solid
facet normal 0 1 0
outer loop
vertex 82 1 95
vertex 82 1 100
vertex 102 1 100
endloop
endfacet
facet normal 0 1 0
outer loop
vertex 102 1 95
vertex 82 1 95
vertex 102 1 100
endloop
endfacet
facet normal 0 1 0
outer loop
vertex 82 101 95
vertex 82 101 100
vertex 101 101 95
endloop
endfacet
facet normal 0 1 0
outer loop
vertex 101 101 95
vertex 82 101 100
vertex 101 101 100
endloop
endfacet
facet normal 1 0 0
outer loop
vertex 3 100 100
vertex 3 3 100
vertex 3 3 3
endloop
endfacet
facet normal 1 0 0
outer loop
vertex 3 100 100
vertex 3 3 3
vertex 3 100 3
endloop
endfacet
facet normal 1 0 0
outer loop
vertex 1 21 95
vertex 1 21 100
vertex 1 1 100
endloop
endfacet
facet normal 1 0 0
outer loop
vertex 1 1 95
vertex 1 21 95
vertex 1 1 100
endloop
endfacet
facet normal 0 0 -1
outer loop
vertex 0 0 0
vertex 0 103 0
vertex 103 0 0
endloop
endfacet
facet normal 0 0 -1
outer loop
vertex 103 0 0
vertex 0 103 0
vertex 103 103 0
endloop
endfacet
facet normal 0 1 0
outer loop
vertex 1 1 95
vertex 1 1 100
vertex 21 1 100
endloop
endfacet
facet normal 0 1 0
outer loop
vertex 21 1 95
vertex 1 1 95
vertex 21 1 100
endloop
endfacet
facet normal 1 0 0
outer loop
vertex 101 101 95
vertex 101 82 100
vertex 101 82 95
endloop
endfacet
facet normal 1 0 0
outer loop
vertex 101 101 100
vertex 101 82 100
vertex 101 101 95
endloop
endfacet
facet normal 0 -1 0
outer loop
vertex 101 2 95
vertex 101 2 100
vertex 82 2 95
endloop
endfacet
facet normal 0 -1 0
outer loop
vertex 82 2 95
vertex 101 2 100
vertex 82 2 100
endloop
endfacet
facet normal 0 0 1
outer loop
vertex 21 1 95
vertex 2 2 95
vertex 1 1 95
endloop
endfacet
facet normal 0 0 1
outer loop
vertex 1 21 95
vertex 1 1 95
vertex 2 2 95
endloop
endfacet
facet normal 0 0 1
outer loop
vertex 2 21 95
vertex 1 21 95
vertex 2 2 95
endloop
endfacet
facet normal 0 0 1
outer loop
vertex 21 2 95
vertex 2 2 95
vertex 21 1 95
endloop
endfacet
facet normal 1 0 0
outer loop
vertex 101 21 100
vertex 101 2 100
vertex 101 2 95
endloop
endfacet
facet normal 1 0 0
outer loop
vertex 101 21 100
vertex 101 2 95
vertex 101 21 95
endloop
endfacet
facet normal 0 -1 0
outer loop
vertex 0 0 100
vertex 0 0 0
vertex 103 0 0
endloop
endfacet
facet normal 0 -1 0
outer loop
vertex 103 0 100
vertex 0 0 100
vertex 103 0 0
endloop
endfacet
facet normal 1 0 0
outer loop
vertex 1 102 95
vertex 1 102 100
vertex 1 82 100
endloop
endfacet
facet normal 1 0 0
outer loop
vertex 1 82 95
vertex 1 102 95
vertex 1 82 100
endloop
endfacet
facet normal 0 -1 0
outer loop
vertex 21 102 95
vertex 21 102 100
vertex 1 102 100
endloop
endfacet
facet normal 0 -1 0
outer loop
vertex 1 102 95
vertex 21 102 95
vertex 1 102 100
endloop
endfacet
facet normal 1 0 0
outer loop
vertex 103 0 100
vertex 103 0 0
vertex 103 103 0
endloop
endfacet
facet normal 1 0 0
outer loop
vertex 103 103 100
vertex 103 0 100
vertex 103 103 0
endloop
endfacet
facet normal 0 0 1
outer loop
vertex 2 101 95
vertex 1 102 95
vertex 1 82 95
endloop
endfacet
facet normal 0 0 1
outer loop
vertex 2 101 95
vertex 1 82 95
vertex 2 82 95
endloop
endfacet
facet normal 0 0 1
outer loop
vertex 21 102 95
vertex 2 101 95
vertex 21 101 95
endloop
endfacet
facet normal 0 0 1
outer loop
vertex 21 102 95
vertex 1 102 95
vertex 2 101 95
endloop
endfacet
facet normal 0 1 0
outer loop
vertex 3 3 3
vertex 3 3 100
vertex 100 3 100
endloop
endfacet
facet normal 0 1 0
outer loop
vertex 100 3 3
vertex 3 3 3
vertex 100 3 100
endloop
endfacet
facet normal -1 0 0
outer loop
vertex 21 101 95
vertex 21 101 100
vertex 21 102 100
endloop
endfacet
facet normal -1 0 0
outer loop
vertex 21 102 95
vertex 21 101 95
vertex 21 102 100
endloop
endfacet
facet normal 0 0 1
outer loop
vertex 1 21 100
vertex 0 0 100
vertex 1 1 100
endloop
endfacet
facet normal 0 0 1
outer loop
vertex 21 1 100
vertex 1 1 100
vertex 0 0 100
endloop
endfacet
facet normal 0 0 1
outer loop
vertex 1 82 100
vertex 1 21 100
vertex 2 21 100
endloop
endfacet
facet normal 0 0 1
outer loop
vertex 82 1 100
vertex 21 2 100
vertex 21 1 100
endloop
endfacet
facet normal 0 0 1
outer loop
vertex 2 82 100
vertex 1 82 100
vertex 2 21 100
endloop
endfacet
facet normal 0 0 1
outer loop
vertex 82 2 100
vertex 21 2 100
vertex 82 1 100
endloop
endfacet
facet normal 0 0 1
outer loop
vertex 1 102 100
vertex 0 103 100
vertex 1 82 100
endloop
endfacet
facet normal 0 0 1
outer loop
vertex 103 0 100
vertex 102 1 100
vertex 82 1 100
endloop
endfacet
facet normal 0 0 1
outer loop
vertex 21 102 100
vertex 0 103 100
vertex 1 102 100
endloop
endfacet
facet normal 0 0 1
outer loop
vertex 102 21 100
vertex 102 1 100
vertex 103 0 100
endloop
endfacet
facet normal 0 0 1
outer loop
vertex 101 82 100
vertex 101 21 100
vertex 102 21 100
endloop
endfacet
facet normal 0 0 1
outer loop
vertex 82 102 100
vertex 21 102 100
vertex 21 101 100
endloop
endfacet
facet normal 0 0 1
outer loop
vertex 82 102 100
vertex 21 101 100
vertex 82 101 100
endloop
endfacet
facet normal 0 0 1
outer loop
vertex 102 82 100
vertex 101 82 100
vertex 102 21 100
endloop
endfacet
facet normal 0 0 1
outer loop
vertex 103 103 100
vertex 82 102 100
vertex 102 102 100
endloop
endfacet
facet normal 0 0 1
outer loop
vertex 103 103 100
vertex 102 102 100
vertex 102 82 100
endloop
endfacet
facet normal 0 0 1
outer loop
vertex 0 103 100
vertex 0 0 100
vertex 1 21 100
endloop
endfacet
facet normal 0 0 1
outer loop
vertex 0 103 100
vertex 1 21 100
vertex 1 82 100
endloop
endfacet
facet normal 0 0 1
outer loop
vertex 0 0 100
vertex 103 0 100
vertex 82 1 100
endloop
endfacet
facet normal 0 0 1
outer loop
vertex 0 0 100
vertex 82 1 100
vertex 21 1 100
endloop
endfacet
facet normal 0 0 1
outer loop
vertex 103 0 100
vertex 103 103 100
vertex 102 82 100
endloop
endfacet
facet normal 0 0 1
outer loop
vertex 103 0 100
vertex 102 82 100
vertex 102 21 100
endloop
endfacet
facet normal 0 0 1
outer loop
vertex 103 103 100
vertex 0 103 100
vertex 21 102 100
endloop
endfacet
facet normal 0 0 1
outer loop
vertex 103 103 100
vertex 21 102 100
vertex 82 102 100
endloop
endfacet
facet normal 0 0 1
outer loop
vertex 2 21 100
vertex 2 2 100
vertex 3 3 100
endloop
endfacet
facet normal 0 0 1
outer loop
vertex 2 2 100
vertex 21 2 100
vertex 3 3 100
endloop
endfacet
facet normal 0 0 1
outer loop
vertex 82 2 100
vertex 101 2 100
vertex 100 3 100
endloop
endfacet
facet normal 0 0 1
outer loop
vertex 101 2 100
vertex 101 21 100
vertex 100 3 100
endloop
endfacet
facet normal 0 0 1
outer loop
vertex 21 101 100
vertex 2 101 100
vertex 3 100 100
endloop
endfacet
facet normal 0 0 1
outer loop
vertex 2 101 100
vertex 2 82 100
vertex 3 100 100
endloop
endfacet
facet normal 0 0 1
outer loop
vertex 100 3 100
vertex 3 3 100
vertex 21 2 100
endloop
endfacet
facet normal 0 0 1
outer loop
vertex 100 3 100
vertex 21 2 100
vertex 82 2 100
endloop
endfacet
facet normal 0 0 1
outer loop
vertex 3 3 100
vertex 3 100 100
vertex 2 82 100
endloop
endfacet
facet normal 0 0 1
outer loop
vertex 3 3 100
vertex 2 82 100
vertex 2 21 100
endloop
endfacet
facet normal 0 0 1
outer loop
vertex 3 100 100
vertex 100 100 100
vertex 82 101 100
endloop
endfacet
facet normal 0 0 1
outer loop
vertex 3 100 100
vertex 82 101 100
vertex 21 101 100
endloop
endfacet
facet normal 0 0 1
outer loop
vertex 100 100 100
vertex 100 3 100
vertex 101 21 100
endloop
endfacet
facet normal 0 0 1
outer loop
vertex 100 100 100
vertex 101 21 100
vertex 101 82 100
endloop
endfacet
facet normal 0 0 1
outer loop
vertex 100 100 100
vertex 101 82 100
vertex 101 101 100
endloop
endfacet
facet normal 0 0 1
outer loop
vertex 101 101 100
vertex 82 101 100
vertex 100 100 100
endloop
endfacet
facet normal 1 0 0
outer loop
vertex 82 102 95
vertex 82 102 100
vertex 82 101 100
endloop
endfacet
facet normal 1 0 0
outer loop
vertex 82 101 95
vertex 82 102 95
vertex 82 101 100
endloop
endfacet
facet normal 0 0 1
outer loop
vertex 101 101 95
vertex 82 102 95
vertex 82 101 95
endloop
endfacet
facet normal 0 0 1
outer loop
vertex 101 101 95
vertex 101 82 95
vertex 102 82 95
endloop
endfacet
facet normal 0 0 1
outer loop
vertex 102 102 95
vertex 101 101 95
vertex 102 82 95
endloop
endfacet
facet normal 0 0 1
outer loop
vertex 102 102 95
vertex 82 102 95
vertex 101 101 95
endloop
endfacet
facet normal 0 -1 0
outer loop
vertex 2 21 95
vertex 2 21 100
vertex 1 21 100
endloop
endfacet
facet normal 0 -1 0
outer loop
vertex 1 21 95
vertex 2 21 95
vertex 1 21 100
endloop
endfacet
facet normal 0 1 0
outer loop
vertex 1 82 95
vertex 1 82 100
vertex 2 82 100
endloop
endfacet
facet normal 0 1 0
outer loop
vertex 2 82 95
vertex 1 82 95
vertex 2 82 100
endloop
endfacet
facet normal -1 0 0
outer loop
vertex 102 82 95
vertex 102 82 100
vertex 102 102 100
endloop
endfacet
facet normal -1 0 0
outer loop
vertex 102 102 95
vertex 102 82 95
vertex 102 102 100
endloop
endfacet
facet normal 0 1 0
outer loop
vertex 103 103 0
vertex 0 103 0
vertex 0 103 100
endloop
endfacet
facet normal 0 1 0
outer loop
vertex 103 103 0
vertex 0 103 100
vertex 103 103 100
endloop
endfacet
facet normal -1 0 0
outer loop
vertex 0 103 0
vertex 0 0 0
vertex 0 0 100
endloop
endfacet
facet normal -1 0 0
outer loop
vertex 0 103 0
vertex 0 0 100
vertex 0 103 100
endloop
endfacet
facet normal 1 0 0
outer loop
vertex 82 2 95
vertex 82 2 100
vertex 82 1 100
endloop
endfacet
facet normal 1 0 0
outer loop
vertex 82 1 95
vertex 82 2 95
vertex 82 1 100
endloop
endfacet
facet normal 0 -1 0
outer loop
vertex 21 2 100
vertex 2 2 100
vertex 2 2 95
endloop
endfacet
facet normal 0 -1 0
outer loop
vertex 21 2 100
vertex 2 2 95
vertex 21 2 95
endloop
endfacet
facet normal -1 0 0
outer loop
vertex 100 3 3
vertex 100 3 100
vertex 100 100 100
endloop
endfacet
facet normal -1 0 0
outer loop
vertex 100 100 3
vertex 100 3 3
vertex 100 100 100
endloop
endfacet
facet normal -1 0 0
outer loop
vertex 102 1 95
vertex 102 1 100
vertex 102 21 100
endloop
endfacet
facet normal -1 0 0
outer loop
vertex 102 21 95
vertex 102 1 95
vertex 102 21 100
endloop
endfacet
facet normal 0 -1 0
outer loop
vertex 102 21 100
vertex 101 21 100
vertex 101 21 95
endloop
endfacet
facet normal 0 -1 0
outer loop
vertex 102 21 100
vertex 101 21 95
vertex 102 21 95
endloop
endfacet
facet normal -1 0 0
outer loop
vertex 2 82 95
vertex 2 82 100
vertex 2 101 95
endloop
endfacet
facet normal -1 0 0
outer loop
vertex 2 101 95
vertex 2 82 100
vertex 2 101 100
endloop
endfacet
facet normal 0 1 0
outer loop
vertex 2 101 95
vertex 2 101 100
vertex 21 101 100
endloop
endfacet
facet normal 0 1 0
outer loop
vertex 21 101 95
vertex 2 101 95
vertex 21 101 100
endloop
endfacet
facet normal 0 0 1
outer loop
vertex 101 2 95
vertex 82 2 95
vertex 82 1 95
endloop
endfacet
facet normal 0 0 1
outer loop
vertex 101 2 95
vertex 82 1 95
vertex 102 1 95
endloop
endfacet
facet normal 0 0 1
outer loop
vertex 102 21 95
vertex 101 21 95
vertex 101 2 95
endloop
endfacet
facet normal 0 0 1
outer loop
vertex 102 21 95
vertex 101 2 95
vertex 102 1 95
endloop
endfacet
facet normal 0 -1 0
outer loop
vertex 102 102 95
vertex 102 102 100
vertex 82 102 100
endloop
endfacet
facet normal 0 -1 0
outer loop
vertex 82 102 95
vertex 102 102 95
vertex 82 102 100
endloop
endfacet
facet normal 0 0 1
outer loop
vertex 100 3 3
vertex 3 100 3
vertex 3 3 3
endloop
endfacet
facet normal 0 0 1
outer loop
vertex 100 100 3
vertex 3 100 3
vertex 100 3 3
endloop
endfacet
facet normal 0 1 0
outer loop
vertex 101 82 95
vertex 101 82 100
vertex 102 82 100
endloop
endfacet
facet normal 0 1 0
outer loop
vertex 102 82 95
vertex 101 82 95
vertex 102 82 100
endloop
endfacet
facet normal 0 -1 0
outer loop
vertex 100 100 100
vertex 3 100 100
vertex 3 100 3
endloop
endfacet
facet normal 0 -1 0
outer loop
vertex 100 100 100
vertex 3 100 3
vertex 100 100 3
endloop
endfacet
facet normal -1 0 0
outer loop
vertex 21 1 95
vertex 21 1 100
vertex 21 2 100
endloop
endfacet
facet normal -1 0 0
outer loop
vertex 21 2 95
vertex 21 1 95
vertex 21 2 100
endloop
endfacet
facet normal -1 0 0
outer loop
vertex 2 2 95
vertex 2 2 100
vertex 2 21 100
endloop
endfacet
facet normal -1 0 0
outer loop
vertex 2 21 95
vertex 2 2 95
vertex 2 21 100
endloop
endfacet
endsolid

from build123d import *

# Parameters (mm, degrees)
F0_W     = 103
F0_H     = 103
F1_DEPTH = 100
F2_W     = 97
F2_H     = 97
F3_DEPTH = 97
F4_W     = 1
F4_H     = 19
F4_W_2   = 19
F4_H_2   = 1
F5_DEPTH = 5


with BuildPart() as f1:
    # F0 (on Top) → F1 (new body)
    with BuildSketch(Plane.XY):
        with Locations((51.5, 51.5)):
            Rectangle(F0_W, F0_H)
    extrude(amount=F1_DEPTH)

    # F2 (on face) → F3 (cut)
    with BuildSketch(Plane.XY.offset(100)):
        with Locations((51.5, 51.5)):
            Rectangle(F2_W, F2_H)
    extrude(amount=-F3_DEPTH, mode=Mode.SUBTRACT)

    # F4 (on face) → F5 (cut)
    with BuildSketch(Plane.XY.offset(100)):
        Polygon((21, 102), (1, 102), (1, 101), (2, 101), (21, 101), align=None)
        with Locations((1.5, 91.5)):
            Rectangle(F4_W, F4_H)
        Polygon((2, 21), (1, 21), (1, 1), (2, 1), (2, 2), align=None)
        with Locations((11.5, 1.5)):
            Rectangle(F4_W_2, F4_H_2)
        Polygon((101, 2), (82, 2), (82, 1), (102, 1), (102, 2), align=None)
        with Locations((101.5, 11.5)):
            Rectangle(F4_W, F4_H)
        Polygon((102, 102), (82, 102), (82, 101), (101, 101), (102, 101), align=None)
        with Locations((101.5, 91.5)):
            Rectangle(F4_W, F4_H)
    extrude(amount=-F5_DEPTH, mode=Mode.SUBTRACT)


solid = f1.part
